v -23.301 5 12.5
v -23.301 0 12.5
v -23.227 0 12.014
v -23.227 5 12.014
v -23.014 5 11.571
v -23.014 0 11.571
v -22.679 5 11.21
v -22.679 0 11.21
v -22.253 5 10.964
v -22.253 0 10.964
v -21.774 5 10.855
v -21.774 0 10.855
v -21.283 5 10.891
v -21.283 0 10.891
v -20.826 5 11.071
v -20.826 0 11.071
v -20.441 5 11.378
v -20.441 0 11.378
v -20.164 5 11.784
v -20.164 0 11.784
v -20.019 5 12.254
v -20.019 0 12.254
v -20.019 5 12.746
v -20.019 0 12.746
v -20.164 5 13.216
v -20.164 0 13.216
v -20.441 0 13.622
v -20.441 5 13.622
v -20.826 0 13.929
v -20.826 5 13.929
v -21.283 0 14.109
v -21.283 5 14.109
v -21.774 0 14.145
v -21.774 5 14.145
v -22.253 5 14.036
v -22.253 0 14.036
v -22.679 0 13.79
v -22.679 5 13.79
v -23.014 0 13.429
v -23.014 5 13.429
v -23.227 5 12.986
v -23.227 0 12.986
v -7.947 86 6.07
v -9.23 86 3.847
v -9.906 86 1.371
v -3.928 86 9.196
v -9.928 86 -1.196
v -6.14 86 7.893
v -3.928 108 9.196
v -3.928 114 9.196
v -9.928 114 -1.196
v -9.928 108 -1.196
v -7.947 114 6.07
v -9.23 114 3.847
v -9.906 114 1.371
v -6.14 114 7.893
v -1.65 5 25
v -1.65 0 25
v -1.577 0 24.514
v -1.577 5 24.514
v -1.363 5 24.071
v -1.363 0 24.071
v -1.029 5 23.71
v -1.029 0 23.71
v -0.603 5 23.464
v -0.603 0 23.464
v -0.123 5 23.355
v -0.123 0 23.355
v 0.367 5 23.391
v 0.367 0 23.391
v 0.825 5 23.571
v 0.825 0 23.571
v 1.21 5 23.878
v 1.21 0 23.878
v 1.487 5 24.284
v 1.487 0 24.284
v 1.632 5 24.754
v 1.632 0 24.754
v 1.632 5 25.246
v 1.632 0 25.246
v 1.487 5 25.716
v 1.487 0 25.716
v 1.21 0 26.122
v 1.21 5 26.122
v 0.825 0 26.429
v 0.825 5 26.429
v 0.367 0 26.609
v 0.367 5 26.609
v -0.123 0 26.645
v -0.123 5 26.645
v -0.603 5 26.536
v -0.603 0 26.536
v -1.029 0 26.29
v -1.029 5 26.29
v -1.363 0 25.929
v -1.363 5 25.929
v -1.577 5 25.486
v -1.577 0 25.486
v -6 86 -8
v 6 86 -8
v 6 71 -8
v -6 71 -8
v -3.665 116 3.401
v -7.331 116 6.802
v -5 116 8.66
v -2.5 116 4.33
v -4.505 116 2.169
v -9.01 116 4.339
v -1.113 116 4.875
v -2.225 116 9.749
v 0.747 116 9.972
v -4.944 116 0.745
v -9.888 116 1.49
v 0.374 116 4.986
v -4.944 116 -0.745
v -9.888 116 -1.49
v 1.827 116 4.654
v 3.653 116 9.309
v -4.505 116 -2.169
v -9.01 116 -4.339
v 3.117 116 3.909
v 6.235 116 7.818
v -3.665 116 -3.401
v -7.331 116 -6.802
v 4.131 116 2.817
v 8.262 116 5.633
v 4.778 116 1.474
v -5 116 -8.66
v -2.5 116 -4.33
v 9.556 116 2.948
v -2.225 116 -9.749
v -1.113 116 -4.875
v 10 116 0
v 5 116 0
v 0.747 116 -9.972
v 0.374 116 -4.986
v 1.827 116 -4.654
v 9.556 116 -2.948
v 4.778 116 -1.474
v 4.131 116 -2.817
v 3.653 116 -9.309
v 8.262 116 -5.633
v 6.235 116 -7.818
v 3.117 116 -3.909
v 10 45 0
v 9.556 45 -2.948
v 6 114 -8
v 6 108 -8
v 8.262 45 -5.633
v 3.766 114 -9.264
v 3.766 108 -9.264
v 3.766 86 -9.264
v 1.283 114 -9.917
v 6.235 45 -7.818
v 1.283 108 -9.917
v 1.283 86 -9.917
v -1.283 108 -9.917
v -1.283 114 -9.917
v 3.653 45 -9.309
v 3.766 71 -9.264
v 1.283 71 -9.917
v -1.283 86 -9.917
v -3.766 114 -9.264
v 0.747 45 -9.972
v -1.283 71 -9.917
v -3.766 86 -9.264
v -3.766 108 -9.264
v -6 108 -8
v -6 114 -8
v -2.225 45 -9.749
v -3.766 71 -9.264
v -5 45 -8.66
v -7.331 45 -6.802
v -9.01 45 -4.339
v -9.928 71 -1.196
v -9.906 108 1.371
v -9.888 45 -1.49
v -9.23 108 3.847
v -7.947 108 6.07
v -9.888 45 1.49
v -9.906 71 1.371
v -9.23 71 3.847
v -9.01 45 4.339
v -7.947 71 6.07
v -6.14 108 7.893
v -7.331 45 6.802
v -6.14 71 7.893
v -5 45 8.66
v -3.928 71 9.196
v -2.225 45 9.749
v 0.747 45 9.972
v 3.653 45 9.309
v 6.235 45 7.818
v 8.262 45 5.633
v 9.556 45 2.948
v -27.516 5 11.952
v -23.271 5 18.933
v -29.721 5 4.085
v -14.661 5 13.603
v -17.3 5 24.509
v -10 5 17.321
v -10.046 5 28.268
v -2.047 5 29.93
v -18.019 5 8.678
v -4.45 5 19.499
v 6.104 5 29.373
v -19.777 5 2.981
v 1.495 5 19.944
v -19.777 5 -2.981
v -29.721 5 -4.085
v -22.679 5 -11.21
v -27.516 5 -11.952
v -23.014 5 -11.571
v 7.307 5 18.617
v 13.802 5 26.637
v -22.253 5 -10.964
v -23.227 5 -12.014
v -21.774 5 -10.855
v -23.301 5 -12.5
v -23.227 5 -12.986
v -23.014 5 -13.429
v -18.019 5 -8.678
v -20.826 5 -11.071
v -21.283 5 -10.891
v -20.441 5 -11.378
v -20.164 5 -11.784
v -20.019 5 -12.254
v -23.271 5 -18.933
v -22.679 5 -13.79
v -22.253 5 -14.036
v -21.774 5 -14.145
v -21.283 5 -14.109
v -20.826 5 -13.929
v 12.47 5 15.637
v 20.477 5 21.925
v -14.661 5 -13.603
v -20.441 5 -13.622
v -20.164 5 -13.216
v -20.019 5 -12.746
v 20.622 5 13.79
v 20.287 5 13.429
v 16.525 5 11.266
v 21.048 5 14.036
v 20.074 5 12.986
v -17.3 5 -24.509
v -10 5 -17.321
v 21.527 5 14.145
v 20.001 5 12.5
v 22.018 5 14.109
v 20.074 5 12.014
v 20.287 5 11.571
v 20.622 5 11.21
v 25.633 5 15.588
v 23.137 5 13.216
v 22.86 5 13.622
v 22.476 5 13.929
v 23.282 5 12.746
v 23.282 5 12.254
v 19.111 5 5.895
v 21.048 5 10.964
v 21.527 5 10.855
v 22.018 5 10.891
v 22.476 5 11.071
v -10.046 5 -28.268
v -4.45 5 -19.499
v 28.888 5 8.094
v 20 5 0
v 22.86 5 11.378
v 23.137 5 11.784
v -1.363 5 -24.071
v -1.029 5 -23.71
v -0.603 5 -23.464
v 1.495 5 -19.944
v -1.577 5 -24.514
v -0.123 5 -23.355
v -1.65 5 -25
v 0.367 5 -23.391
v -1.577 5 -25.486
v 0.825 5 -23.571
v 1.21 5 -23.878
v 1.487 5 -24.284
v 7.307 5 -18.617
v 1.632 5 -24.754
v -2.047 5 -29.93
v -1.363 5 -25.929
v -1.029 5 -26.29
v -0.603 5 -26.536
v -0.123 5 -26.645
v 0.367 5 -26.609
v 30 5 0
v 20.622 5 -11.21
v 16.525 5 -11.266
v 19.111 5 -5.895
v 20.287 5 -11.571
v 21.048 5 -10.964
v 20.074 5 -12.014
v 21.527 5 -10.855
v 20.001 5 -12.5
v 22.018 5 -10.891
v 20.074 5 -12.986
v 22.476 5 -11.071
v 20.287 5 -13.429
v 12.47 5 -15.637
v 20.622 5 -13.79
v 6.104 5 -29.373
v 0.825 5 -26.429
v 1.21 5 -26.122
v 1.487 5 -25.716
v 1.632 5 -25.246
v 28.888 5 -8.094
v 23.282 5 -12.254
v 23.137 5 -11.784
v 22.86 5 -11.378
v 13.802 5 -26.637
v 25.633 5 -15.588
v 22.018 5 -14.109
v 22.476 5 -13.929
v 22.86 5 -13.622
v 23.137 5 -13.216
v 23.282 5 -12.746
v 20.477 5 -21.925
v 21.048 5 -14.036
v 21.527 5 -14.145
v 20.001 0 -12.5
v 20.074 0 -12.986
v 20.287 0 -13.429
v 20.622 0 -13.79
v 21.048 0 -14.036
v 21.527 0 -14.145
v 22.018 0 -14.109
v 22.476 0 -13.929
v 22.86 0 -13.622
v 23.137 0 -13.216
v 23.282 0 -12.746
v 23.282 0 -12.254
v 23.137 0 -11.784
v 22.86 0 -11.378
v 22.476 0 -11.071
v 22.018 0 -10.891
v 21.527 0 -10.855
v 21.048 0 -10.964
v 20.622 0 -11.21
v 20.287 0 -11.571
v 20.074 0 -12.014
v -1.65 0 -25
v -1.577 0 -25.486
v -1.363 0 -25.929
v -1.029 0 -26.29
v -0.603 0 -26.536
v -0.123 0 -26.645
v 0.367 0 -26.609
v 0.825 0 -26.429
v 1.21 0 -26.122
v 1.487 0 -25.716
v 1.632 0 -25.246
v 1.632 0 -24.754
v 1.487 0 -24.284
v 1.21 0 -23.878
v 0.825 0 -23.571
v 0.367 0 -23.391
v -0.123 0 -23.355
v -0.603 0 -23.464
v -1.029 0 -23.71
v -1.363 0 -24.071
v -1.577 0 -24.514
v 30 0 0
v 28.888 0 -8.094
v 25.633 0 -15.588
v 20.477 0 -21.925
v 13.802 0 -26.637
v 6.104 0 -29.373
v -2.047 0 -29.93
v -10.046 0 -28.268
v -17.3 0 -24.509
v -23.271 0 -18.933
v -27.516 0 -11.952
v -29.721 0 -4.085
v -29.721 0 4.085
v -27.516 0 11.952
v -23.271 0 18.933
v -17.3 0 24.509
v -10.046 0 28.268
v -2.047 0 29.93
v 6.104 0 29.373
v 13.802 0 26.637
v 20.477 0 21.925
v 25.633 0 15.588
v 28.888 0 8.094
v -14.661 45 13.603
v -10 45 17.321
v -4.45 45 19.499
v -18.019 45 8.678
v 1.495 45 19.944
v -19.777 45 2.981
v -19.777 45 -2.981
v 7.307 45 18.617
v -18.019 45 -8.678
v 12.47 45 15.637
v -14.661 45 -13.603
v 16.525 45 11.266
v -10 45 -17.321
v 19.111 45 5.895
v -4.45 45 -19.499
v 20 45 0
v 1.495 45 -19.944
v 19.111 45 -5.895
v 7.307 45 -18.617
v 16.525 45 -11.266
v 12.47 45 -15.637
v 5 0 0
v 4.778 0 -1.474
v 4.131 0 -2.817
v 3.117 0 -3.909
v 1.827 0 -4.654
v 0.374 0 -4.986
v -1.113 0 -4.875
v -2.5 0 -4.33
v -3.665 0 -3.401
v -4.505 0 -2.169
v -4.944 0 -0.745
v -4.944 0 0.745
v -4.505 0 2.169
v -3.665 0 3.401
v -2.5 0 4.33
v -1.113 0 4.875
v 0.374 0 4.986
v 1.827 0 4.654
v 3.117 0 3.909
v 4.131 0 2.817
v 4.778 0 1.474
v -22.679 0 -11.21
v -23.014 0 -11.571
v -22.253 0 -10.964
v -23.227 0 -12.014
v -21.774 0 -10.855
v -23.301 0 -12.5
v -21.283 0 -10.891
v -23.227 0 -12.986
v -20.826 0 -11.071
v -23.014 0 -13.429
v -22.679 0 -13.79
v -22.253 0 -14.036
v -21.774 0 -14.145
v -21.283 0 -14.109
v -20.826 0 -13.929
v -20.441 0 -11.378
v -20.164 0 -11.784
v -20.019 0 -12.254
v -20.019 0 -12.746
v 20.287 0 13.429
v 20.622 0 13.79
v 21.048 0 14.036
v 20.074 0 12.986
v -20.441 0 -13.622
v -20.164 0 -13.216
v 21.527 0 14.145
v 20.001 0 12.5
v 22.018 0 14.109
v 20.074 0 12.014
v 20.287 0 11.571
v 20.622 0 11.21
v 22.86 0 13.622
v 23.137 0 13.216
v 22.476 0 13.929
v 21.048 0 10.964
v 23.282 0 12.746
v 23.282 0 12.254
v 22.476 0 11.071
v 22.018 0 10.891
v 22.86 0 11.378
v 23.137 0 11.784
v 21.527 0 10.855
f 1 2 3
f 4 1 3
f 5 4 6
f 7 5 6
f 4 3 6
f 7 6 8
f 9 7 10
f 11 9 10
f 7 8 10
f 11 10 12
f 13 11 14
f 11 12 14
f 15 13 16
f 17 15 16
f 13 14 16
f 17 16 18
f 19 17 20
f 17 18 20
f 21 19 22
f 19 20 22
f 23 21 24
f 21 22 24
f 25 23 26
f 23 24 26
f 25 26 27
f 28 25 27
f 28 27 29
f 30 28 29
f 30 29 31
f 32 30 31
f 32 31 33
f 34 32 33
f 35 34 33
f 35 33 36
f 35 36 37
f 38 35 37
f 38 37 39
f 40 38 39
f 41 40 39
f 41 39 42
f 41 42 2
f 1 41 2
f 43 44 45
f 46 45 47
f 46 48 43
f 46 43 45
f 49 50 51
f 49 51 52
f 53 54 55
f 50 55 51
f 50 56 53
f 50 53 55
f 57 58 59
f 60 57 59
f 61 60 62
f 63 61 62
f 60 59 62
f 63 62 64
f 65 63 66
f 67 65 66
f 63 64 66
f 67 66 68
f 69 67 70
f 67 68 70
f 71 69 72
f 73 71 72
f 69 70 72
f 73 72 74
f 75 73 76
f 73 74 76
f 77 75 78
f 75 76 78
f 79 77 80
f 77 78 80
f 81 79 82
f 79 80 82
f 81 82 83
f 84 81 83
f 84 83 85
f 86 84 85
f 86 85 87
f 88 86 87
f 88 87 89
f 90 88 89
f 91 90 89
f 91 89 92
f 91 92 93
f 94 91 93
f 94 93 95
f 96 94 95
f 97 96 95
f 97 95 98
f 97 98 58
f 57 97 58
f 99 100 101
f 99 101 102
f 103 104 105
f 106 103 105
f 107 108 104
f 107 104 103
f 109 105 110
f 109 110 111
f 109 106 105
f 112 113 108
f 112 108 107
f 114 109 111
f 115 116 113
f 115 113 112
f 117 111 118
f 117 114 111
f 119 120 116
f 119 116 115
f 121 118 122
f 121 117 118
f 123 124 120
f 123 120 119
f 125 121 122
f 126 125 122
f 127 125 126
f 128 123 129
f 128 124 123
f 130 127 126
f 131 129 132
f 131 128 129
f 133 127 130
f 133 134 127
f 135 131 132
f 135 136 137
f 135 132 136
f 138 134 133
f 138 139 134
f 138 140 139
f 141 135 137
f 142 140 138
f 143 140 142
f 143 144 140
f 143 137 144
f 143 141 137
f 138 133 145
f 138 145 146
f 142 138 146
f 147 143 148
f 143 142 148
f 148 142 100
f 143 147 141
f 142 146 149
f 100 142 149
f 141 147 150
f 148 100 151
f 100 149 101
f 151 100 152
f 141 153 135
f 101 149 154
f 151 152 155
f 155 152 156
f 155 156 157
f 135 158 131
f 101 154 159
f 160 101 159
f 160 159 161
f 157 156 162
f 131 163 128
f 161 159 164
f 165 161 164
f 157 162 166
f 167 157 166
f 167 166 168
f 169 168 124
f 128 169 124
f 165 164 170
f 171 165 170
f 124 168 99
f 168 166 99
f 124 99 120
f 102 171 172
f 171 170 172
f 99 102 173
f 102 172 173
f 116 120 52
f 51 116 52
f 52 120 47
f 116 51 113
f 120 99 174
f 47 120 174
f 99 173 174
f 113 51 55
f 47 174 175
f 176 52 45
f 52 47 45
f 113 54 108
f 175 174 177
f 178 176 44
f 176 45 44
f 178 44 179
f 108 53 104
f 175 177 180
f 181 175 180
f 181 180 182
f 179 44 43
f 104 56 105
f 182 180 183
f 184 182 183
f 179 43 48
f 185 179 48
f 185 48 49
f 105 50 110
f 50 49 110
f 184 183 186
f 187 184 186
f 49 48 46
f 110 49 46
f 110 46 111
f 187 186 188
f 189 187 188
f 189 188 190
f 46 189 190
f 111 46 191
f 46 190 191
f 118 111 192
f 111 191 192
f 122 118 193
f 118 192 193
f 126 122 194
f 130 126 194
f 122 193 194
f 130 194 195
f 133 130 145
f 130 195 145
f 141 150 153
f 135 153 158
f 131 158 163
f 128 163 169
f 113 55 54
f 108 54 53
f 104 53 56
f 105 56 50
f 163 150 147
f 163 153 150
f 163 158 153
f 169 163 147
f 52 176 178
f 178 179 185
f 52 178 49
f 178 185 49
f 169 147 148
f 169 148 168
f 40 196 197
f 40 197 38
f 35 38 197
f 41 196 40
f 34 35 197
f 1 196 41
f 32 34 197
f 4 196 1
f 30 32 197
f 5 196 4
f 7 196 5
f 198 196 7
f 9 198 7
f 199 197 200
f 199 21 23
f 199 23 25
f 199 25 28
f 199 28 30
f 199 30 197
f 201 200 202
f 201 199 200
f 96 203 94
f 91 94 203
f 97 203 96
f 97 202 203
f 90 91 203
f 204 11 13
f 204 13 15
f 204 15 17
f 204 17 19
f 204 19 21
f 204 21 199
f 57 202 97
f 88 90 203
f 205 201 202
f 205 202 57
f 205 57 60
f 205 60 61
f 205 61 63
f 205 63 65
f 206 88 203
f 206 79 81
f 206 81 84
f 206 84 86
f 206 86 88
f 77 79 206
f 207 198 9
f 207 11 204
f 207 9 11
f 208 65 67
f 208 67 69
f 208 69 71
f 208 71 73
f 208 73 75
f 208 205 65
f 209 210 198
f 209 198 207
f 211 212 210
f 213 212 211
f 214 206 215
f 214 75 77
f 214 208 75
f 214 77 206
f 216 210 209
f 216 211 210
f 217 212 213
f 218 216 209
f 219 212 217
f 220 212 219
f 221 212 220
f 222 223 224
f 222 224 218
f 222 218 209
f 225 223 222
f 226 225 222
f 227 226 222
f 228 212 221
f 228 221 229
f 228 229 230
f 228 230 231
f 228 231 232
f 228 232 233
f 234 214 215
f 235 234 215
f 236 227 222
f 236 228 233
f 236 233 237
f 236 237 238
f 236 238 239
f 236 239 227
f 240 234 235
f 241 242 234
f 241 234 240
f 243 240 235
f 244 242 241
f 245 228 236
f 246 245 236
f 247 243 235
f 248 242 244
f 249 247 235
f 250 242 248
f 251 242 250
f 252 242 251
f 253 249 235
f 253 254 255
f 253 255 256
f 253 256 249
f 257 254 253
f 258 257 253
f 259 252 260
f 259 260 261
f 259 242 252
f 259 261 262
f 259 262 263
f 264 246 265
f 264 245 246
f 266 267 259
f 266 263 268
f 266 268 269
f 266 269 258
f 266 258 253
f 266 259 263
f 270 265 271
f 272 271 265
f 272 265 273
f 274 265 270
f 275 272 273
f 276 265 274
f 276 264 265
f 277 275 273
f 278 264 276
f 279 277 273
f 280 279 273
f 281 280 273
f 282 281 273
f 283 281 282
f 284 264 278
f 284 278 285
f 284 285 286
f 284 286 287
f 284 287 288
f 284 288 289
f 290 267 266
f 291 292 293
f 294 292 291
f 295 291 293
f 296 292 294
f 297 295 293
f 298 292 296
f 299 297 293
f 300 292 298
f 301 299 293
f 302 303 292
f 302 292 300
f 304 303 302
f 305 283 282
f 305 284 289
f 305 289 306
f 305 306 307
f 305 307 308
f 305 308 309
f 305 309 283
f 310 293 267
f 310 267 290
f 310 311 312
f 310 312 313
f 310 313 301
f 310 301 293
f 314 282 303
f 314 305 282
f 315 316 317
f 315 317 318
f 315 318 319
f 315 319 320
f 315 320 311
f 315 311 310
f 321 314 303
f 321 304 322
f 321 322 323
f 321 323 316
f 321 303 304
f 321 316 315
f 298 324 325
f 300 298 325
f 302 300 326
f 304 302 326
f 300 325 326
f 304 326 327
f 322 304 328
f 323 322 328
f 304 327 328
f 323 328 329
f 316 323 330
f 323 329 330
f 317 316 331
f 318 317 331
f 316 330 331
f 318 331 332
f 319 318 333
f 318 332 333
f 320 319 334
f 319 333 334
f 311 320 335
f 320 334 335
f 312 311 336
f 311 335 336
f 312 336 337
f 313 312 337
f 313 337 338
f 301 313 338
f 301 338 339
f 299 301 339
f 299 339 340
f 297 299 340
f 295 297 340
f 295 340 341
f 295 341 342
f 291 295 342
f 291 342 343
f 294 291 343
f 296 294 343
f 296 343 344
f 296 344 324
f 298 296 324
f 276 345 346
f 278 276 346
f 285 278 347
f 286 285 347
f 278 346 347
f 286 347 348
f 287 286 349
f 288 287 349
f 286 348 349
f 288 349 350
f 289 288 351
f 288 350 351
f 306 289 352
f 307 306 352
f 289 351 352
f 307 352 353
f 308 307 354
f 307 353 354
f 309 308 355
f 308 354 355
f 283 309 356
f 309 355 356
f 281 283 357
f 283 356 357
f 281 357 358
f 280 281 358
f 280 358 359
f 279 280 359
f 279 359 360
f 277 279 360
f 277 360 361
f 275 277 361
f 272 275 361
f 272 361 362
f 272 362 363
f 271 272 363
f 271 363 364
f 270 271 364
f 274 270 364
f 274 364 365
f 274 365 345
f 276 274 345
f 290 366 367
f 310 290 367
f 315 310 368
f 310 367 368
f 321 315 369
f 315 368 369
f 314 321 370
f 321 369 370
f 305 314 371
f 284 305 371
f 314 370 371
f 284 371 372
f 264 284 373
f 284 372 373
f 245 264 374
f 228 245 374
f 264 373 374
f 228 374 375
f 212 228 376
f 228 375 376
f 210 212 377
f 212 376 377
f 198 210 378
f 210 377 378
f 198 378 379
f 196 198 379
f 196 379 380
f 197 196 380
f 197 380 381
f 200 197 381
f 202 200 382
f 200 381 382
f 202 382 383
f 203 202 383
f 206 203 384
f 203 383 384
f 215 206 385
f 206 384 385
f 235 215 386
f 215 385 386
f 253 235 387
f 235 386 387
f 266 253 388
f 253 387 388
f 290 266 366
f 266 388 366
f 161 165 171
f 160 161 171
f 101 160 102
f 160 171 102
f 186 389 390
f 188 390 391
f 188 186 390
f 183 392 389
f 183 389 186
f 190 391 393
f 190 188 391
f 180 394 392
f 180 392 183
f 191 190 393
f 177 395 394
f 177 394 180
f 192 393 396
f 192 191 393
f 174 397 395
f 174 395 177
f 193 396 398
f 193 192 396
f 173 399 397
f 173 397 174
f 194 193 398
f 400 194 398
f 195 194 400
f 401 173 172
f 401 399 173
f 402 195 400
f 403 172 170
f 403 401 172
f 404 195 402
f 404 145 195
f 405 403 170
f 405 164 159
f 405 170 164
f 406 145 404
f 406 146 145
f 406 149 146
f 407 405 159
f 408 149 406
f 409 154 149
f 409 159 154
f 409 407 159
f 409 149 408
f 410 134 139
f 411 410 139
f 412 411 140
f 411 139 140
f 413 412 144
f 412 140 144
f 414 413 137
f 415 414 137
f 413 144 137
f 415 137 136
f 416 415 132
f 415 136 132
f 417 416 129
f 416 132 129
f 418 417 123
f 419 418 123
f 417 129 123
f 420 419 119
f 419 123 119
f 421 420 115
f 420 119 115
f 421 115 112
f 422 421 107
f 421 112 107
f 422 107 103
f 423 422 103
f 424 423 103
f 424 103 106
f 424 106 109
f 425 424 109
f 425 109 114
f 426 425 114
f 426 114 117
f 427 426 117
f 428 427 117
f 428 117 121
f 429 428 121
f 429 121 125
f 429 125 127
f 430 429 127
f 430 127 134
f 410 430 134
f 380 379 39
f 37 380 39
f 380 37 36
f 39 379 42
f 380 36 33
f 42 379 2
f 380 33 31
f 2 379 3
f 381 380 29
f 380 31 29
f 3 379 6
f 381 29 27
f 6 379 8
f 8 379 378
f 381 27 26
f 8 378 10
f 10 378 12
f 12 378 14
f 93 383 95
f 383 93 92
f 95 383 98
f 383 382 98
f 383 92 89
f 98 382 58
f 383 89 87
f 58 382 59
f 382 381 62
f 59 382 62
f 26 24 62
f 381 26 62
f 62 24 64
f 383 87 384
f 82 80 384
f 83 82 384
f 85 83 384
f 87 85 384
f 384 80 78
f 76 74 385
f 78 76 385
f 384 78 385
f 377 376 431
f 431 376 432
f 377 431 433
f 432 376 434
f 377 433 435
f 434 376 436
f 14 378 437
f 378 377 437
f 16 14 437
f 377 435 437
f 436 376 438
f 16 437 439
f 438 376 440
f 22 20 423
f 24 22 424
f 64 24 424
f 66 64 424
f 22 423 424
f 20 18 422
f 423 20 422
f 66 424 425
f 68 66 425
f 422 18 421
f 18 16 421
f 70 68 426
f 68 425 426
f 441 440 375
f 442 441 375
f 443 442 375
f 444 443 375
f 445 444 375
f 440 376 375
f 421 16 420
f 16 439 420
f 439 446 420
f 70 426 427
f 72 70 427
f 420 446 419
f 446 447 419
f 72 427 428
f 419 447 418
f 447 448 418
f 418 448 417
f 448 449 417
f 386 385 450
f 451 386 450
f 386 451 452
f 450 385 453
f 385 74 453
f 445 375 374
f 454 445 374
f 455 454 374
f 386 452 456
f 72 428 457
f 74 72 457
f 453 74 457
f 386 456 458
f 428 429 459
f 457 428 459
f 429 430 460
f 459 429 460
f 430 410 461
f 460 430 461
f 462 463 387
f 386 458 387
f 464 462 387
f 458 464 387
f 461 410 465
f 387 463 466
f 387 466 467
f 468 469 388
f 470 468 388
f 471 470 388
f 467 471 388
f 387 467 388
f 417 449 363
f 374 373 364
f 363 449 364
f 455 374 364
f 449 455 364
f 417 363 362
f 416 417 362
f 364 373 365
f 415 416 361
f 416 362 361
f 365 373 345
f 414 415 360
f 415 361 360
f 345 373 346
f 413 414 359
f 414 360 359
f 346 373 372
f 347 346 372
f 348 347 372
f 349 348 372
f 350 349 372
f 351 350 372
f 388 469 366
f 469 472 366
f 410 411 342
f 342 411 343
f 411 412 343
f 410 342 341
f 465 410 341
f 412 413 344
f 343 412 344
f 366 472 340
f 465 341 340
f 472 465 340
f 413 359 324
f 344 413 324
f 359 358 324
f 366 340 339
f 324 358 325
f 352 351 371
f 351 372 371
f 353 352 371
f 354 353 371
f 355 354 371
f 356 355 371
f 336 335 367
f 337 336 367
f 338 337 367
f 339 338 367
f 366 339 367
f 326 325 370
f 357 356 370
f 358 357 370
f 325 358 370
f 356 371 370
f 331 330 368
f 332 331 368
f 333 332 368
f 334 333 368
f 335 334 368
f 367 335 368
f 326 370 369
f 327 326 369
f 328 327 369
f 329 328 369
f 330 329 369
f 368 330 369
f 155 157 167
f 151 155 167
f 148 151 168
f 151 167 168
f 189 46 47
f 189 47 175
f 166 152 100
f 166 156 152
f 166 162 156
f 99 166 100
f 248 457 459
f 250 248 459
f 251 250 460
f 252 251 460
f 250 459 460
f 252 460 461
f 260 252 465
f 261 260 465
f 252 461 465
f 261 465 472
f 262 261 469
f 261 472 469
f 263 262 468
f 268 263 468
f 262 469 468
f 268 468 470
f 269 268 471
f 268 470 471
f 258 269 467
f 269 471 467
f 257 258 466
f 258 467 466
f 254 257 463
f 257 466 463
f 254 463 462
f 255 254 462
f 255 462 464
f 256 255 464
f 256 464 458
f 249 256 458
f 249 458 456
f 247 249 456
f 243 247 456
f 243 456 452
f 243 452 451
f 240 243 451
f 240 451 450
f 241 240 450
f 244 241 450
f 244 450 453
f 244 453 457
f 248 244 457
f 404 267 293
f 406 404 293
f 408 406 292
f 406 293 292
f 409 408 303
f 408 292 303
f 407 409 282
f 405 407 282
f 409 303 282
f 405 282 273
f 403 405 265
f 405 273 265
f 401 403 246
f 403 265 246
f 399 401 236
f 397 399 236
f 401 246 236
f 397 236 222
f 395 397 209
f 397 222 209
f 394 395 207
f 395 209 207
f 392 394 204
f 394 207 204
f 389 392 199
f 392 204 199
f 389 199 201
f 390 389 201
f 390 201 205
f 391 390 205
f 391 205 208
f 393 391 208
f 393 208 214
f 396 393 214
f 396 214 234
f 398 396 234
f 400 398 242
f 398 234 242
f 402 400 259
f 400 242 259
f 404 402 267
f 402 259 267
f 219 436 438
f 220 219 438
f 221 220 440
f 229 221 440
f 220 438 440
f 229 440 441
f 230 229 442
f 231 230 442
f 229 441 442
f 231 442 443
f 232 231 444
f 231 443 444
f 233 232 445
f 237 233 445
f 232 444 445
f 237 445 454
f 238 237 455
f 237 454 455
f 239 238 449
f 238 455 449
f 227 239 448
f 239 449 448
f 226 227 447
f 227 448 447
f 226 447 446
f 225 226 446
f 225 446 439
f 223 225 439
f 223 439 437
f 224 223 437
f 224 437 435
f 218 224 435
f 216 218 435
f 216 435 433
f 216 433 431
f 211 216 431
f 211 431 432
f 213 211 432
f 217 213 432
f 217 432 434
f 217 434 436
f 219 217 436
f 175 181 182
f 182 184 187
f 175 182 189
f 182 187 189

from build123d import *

# Parameters (mm, degrees)
SKETCH_1_R             = 30
EXTRUDE_1_DEPTH        = 5
SKETCH_2_R             = 20
EXTRUDE_2_DEPTH        = 40
SKETCH_5_R             = 10
EXTRUDE_3_DEPTH        = 71
CUT_EXTRUDE_2_REACH    = 118
SKETCH_6_R             = 5
SKETCH_7_W             = 15
SKETCH_7_H             = 15
CUT_EXTRUDE_3_DEPTH    = 2
SKETCH_8_W             = 15
SKETCH_8_H             = 15
CUT_EXTRUDE_4_DEPTH    = 2
HOLE_WIZARD_M4_2_D     = 3.3
HOLE_WIZARD_M4_2_DEPTH = 5
SKETCH_21_W            = 6
SKETCH_21_H            = 15
CUT_EXTRUDE_5_DEPTH    = 2
SKETCH_22_W            = 15
SKETCH_22_H            = 6
CUT_EXTRUDE_6_DEPTH    = 2


with BuildPart() as part:
    # 스케치1 → 보스-돌출1 (new body)
    with BuildSketch(Plane(origin=(0, 0, 0), x_dir=(1, 0, 0), z_dir=(0, 1, 0))):
        Circle(SKETCH_1_R)
    extrude(amount=EXTRUDE_1_DEPTH)

    # 스케치2 → 보스-돌출2 (add)
    with BuildSketch(Plane(origin=(0, 5, 0), x_dir=(1, 0, 0), z_dir=(0, 1, 0))):
        Circle(SKETCH_2_R)
    extrude(amount=EXTRUDE_2_DEPTH)

    # 스케치5 → 보스-돌출3 (add)
    with BuildSketch(Plane(origin=(0, 45, 0), x_dir=(1, 0, 0), z_dir=(0, 1, 0))):
        Circle(SKETCH_5_R)
    extrude(amount=EXTRUDE_3_DEPTH)

    # 스케치6 → 컷-돌출2 (cut, up to next)
    with BuildSketch(Plane(origin=(0, 116, 0), x_dir=(1, 0, 0), z_dir=(0, 1, 0)), mode=Mode.PRIVATE) as cut_extrude_2_sk1:
        Circle(SKETCH_6_R)
    cut_extrude_2_tool1 = extrude(cut_extrude_2_sk1.sketch, amount=-CUT_EXTRUDE_2_REACH, mode=Mode.PRIVATE) & part.part
    add(cut_extrude_2_tool1.solids().sort_by_distance((0, 116, 0))[0], mode=Mode.SUBTRACT)

    # 스케치7 → 컷-돌출3 (cut)
    with BuildSketch(Plane(origin=(0, 0, -10), x_dir=(-1, 0, 0), z_dir=(0, 0, -1))):
        with Locations((0, 78.5)):
            Rectangle(SKETCH_7_W, SKETCH_7_H)
    extrude(amount=-CUT_EXTRUDE_3_DEPTH, mode=Mode.SUBTRACT)

    # 스케치8 → 컷-돌출4 (cut)
    with BuildSketch(Plane(origin=(-8.660254038, 0, 5), x_dir=(0, -1, 0), z_dir=(-0.866025404, 0, 0.5))):
        with Locations((-78.5, 0)):
            Rectangle(SKETCH_8_W, SKETCH_8_H)
    extrude(amount=-CUT_EXTRUDE_4_DEPTH, mode=Mode.SUBTRACT)

    # M4 나사 구멍2
    with Locations(Plane(origin=(0, 5, 0), x_dir=(1, 0, 0), z_dir=(0, 1, 0))):
        with Locations((0, 25), (21.650635095, 12.5), (21.650635095, -12.5), (-21.650635095, 12.5), (-21.650635095, -12.5), (0, -25)):
            Hole(HOLE_WIZARD_M4_2_D / 2, depth=HOLE_WIZARD_M4_2_DEPTH)

    # 스케치21 → 컷-돌출5 (cut)
    with BuildSketch(Plane(origin=(-8.660254038, 0, 5), x_dir=(0, -1, 0), z_dir=(-0.866025404, 0, 0.5))):
        with Locations((-111, 0)):
            Rectangle(SKETCH_21_W, SKETCH_21_H)
    extrude(amount=-CUT_EXTRUDE_5_DEPTH, mode=Mode.SUBTRACT)

    # 스케치22 → 컷-돌출6 (cut)
    with BuildSketch(Plane(origin=(0, 0, -10), x_dir=(-1, 0, 0), z_dir=(0, 0, -1))):
        with Locations((0.623419069, 111)):
            Rectangle(SKETCH_22_W, SKETCH_22_H)
    extrude(amount=-CUT_EXTRUDE_6_DEPTH, mode=Mode.SUBTRACT)


solid = part.part
